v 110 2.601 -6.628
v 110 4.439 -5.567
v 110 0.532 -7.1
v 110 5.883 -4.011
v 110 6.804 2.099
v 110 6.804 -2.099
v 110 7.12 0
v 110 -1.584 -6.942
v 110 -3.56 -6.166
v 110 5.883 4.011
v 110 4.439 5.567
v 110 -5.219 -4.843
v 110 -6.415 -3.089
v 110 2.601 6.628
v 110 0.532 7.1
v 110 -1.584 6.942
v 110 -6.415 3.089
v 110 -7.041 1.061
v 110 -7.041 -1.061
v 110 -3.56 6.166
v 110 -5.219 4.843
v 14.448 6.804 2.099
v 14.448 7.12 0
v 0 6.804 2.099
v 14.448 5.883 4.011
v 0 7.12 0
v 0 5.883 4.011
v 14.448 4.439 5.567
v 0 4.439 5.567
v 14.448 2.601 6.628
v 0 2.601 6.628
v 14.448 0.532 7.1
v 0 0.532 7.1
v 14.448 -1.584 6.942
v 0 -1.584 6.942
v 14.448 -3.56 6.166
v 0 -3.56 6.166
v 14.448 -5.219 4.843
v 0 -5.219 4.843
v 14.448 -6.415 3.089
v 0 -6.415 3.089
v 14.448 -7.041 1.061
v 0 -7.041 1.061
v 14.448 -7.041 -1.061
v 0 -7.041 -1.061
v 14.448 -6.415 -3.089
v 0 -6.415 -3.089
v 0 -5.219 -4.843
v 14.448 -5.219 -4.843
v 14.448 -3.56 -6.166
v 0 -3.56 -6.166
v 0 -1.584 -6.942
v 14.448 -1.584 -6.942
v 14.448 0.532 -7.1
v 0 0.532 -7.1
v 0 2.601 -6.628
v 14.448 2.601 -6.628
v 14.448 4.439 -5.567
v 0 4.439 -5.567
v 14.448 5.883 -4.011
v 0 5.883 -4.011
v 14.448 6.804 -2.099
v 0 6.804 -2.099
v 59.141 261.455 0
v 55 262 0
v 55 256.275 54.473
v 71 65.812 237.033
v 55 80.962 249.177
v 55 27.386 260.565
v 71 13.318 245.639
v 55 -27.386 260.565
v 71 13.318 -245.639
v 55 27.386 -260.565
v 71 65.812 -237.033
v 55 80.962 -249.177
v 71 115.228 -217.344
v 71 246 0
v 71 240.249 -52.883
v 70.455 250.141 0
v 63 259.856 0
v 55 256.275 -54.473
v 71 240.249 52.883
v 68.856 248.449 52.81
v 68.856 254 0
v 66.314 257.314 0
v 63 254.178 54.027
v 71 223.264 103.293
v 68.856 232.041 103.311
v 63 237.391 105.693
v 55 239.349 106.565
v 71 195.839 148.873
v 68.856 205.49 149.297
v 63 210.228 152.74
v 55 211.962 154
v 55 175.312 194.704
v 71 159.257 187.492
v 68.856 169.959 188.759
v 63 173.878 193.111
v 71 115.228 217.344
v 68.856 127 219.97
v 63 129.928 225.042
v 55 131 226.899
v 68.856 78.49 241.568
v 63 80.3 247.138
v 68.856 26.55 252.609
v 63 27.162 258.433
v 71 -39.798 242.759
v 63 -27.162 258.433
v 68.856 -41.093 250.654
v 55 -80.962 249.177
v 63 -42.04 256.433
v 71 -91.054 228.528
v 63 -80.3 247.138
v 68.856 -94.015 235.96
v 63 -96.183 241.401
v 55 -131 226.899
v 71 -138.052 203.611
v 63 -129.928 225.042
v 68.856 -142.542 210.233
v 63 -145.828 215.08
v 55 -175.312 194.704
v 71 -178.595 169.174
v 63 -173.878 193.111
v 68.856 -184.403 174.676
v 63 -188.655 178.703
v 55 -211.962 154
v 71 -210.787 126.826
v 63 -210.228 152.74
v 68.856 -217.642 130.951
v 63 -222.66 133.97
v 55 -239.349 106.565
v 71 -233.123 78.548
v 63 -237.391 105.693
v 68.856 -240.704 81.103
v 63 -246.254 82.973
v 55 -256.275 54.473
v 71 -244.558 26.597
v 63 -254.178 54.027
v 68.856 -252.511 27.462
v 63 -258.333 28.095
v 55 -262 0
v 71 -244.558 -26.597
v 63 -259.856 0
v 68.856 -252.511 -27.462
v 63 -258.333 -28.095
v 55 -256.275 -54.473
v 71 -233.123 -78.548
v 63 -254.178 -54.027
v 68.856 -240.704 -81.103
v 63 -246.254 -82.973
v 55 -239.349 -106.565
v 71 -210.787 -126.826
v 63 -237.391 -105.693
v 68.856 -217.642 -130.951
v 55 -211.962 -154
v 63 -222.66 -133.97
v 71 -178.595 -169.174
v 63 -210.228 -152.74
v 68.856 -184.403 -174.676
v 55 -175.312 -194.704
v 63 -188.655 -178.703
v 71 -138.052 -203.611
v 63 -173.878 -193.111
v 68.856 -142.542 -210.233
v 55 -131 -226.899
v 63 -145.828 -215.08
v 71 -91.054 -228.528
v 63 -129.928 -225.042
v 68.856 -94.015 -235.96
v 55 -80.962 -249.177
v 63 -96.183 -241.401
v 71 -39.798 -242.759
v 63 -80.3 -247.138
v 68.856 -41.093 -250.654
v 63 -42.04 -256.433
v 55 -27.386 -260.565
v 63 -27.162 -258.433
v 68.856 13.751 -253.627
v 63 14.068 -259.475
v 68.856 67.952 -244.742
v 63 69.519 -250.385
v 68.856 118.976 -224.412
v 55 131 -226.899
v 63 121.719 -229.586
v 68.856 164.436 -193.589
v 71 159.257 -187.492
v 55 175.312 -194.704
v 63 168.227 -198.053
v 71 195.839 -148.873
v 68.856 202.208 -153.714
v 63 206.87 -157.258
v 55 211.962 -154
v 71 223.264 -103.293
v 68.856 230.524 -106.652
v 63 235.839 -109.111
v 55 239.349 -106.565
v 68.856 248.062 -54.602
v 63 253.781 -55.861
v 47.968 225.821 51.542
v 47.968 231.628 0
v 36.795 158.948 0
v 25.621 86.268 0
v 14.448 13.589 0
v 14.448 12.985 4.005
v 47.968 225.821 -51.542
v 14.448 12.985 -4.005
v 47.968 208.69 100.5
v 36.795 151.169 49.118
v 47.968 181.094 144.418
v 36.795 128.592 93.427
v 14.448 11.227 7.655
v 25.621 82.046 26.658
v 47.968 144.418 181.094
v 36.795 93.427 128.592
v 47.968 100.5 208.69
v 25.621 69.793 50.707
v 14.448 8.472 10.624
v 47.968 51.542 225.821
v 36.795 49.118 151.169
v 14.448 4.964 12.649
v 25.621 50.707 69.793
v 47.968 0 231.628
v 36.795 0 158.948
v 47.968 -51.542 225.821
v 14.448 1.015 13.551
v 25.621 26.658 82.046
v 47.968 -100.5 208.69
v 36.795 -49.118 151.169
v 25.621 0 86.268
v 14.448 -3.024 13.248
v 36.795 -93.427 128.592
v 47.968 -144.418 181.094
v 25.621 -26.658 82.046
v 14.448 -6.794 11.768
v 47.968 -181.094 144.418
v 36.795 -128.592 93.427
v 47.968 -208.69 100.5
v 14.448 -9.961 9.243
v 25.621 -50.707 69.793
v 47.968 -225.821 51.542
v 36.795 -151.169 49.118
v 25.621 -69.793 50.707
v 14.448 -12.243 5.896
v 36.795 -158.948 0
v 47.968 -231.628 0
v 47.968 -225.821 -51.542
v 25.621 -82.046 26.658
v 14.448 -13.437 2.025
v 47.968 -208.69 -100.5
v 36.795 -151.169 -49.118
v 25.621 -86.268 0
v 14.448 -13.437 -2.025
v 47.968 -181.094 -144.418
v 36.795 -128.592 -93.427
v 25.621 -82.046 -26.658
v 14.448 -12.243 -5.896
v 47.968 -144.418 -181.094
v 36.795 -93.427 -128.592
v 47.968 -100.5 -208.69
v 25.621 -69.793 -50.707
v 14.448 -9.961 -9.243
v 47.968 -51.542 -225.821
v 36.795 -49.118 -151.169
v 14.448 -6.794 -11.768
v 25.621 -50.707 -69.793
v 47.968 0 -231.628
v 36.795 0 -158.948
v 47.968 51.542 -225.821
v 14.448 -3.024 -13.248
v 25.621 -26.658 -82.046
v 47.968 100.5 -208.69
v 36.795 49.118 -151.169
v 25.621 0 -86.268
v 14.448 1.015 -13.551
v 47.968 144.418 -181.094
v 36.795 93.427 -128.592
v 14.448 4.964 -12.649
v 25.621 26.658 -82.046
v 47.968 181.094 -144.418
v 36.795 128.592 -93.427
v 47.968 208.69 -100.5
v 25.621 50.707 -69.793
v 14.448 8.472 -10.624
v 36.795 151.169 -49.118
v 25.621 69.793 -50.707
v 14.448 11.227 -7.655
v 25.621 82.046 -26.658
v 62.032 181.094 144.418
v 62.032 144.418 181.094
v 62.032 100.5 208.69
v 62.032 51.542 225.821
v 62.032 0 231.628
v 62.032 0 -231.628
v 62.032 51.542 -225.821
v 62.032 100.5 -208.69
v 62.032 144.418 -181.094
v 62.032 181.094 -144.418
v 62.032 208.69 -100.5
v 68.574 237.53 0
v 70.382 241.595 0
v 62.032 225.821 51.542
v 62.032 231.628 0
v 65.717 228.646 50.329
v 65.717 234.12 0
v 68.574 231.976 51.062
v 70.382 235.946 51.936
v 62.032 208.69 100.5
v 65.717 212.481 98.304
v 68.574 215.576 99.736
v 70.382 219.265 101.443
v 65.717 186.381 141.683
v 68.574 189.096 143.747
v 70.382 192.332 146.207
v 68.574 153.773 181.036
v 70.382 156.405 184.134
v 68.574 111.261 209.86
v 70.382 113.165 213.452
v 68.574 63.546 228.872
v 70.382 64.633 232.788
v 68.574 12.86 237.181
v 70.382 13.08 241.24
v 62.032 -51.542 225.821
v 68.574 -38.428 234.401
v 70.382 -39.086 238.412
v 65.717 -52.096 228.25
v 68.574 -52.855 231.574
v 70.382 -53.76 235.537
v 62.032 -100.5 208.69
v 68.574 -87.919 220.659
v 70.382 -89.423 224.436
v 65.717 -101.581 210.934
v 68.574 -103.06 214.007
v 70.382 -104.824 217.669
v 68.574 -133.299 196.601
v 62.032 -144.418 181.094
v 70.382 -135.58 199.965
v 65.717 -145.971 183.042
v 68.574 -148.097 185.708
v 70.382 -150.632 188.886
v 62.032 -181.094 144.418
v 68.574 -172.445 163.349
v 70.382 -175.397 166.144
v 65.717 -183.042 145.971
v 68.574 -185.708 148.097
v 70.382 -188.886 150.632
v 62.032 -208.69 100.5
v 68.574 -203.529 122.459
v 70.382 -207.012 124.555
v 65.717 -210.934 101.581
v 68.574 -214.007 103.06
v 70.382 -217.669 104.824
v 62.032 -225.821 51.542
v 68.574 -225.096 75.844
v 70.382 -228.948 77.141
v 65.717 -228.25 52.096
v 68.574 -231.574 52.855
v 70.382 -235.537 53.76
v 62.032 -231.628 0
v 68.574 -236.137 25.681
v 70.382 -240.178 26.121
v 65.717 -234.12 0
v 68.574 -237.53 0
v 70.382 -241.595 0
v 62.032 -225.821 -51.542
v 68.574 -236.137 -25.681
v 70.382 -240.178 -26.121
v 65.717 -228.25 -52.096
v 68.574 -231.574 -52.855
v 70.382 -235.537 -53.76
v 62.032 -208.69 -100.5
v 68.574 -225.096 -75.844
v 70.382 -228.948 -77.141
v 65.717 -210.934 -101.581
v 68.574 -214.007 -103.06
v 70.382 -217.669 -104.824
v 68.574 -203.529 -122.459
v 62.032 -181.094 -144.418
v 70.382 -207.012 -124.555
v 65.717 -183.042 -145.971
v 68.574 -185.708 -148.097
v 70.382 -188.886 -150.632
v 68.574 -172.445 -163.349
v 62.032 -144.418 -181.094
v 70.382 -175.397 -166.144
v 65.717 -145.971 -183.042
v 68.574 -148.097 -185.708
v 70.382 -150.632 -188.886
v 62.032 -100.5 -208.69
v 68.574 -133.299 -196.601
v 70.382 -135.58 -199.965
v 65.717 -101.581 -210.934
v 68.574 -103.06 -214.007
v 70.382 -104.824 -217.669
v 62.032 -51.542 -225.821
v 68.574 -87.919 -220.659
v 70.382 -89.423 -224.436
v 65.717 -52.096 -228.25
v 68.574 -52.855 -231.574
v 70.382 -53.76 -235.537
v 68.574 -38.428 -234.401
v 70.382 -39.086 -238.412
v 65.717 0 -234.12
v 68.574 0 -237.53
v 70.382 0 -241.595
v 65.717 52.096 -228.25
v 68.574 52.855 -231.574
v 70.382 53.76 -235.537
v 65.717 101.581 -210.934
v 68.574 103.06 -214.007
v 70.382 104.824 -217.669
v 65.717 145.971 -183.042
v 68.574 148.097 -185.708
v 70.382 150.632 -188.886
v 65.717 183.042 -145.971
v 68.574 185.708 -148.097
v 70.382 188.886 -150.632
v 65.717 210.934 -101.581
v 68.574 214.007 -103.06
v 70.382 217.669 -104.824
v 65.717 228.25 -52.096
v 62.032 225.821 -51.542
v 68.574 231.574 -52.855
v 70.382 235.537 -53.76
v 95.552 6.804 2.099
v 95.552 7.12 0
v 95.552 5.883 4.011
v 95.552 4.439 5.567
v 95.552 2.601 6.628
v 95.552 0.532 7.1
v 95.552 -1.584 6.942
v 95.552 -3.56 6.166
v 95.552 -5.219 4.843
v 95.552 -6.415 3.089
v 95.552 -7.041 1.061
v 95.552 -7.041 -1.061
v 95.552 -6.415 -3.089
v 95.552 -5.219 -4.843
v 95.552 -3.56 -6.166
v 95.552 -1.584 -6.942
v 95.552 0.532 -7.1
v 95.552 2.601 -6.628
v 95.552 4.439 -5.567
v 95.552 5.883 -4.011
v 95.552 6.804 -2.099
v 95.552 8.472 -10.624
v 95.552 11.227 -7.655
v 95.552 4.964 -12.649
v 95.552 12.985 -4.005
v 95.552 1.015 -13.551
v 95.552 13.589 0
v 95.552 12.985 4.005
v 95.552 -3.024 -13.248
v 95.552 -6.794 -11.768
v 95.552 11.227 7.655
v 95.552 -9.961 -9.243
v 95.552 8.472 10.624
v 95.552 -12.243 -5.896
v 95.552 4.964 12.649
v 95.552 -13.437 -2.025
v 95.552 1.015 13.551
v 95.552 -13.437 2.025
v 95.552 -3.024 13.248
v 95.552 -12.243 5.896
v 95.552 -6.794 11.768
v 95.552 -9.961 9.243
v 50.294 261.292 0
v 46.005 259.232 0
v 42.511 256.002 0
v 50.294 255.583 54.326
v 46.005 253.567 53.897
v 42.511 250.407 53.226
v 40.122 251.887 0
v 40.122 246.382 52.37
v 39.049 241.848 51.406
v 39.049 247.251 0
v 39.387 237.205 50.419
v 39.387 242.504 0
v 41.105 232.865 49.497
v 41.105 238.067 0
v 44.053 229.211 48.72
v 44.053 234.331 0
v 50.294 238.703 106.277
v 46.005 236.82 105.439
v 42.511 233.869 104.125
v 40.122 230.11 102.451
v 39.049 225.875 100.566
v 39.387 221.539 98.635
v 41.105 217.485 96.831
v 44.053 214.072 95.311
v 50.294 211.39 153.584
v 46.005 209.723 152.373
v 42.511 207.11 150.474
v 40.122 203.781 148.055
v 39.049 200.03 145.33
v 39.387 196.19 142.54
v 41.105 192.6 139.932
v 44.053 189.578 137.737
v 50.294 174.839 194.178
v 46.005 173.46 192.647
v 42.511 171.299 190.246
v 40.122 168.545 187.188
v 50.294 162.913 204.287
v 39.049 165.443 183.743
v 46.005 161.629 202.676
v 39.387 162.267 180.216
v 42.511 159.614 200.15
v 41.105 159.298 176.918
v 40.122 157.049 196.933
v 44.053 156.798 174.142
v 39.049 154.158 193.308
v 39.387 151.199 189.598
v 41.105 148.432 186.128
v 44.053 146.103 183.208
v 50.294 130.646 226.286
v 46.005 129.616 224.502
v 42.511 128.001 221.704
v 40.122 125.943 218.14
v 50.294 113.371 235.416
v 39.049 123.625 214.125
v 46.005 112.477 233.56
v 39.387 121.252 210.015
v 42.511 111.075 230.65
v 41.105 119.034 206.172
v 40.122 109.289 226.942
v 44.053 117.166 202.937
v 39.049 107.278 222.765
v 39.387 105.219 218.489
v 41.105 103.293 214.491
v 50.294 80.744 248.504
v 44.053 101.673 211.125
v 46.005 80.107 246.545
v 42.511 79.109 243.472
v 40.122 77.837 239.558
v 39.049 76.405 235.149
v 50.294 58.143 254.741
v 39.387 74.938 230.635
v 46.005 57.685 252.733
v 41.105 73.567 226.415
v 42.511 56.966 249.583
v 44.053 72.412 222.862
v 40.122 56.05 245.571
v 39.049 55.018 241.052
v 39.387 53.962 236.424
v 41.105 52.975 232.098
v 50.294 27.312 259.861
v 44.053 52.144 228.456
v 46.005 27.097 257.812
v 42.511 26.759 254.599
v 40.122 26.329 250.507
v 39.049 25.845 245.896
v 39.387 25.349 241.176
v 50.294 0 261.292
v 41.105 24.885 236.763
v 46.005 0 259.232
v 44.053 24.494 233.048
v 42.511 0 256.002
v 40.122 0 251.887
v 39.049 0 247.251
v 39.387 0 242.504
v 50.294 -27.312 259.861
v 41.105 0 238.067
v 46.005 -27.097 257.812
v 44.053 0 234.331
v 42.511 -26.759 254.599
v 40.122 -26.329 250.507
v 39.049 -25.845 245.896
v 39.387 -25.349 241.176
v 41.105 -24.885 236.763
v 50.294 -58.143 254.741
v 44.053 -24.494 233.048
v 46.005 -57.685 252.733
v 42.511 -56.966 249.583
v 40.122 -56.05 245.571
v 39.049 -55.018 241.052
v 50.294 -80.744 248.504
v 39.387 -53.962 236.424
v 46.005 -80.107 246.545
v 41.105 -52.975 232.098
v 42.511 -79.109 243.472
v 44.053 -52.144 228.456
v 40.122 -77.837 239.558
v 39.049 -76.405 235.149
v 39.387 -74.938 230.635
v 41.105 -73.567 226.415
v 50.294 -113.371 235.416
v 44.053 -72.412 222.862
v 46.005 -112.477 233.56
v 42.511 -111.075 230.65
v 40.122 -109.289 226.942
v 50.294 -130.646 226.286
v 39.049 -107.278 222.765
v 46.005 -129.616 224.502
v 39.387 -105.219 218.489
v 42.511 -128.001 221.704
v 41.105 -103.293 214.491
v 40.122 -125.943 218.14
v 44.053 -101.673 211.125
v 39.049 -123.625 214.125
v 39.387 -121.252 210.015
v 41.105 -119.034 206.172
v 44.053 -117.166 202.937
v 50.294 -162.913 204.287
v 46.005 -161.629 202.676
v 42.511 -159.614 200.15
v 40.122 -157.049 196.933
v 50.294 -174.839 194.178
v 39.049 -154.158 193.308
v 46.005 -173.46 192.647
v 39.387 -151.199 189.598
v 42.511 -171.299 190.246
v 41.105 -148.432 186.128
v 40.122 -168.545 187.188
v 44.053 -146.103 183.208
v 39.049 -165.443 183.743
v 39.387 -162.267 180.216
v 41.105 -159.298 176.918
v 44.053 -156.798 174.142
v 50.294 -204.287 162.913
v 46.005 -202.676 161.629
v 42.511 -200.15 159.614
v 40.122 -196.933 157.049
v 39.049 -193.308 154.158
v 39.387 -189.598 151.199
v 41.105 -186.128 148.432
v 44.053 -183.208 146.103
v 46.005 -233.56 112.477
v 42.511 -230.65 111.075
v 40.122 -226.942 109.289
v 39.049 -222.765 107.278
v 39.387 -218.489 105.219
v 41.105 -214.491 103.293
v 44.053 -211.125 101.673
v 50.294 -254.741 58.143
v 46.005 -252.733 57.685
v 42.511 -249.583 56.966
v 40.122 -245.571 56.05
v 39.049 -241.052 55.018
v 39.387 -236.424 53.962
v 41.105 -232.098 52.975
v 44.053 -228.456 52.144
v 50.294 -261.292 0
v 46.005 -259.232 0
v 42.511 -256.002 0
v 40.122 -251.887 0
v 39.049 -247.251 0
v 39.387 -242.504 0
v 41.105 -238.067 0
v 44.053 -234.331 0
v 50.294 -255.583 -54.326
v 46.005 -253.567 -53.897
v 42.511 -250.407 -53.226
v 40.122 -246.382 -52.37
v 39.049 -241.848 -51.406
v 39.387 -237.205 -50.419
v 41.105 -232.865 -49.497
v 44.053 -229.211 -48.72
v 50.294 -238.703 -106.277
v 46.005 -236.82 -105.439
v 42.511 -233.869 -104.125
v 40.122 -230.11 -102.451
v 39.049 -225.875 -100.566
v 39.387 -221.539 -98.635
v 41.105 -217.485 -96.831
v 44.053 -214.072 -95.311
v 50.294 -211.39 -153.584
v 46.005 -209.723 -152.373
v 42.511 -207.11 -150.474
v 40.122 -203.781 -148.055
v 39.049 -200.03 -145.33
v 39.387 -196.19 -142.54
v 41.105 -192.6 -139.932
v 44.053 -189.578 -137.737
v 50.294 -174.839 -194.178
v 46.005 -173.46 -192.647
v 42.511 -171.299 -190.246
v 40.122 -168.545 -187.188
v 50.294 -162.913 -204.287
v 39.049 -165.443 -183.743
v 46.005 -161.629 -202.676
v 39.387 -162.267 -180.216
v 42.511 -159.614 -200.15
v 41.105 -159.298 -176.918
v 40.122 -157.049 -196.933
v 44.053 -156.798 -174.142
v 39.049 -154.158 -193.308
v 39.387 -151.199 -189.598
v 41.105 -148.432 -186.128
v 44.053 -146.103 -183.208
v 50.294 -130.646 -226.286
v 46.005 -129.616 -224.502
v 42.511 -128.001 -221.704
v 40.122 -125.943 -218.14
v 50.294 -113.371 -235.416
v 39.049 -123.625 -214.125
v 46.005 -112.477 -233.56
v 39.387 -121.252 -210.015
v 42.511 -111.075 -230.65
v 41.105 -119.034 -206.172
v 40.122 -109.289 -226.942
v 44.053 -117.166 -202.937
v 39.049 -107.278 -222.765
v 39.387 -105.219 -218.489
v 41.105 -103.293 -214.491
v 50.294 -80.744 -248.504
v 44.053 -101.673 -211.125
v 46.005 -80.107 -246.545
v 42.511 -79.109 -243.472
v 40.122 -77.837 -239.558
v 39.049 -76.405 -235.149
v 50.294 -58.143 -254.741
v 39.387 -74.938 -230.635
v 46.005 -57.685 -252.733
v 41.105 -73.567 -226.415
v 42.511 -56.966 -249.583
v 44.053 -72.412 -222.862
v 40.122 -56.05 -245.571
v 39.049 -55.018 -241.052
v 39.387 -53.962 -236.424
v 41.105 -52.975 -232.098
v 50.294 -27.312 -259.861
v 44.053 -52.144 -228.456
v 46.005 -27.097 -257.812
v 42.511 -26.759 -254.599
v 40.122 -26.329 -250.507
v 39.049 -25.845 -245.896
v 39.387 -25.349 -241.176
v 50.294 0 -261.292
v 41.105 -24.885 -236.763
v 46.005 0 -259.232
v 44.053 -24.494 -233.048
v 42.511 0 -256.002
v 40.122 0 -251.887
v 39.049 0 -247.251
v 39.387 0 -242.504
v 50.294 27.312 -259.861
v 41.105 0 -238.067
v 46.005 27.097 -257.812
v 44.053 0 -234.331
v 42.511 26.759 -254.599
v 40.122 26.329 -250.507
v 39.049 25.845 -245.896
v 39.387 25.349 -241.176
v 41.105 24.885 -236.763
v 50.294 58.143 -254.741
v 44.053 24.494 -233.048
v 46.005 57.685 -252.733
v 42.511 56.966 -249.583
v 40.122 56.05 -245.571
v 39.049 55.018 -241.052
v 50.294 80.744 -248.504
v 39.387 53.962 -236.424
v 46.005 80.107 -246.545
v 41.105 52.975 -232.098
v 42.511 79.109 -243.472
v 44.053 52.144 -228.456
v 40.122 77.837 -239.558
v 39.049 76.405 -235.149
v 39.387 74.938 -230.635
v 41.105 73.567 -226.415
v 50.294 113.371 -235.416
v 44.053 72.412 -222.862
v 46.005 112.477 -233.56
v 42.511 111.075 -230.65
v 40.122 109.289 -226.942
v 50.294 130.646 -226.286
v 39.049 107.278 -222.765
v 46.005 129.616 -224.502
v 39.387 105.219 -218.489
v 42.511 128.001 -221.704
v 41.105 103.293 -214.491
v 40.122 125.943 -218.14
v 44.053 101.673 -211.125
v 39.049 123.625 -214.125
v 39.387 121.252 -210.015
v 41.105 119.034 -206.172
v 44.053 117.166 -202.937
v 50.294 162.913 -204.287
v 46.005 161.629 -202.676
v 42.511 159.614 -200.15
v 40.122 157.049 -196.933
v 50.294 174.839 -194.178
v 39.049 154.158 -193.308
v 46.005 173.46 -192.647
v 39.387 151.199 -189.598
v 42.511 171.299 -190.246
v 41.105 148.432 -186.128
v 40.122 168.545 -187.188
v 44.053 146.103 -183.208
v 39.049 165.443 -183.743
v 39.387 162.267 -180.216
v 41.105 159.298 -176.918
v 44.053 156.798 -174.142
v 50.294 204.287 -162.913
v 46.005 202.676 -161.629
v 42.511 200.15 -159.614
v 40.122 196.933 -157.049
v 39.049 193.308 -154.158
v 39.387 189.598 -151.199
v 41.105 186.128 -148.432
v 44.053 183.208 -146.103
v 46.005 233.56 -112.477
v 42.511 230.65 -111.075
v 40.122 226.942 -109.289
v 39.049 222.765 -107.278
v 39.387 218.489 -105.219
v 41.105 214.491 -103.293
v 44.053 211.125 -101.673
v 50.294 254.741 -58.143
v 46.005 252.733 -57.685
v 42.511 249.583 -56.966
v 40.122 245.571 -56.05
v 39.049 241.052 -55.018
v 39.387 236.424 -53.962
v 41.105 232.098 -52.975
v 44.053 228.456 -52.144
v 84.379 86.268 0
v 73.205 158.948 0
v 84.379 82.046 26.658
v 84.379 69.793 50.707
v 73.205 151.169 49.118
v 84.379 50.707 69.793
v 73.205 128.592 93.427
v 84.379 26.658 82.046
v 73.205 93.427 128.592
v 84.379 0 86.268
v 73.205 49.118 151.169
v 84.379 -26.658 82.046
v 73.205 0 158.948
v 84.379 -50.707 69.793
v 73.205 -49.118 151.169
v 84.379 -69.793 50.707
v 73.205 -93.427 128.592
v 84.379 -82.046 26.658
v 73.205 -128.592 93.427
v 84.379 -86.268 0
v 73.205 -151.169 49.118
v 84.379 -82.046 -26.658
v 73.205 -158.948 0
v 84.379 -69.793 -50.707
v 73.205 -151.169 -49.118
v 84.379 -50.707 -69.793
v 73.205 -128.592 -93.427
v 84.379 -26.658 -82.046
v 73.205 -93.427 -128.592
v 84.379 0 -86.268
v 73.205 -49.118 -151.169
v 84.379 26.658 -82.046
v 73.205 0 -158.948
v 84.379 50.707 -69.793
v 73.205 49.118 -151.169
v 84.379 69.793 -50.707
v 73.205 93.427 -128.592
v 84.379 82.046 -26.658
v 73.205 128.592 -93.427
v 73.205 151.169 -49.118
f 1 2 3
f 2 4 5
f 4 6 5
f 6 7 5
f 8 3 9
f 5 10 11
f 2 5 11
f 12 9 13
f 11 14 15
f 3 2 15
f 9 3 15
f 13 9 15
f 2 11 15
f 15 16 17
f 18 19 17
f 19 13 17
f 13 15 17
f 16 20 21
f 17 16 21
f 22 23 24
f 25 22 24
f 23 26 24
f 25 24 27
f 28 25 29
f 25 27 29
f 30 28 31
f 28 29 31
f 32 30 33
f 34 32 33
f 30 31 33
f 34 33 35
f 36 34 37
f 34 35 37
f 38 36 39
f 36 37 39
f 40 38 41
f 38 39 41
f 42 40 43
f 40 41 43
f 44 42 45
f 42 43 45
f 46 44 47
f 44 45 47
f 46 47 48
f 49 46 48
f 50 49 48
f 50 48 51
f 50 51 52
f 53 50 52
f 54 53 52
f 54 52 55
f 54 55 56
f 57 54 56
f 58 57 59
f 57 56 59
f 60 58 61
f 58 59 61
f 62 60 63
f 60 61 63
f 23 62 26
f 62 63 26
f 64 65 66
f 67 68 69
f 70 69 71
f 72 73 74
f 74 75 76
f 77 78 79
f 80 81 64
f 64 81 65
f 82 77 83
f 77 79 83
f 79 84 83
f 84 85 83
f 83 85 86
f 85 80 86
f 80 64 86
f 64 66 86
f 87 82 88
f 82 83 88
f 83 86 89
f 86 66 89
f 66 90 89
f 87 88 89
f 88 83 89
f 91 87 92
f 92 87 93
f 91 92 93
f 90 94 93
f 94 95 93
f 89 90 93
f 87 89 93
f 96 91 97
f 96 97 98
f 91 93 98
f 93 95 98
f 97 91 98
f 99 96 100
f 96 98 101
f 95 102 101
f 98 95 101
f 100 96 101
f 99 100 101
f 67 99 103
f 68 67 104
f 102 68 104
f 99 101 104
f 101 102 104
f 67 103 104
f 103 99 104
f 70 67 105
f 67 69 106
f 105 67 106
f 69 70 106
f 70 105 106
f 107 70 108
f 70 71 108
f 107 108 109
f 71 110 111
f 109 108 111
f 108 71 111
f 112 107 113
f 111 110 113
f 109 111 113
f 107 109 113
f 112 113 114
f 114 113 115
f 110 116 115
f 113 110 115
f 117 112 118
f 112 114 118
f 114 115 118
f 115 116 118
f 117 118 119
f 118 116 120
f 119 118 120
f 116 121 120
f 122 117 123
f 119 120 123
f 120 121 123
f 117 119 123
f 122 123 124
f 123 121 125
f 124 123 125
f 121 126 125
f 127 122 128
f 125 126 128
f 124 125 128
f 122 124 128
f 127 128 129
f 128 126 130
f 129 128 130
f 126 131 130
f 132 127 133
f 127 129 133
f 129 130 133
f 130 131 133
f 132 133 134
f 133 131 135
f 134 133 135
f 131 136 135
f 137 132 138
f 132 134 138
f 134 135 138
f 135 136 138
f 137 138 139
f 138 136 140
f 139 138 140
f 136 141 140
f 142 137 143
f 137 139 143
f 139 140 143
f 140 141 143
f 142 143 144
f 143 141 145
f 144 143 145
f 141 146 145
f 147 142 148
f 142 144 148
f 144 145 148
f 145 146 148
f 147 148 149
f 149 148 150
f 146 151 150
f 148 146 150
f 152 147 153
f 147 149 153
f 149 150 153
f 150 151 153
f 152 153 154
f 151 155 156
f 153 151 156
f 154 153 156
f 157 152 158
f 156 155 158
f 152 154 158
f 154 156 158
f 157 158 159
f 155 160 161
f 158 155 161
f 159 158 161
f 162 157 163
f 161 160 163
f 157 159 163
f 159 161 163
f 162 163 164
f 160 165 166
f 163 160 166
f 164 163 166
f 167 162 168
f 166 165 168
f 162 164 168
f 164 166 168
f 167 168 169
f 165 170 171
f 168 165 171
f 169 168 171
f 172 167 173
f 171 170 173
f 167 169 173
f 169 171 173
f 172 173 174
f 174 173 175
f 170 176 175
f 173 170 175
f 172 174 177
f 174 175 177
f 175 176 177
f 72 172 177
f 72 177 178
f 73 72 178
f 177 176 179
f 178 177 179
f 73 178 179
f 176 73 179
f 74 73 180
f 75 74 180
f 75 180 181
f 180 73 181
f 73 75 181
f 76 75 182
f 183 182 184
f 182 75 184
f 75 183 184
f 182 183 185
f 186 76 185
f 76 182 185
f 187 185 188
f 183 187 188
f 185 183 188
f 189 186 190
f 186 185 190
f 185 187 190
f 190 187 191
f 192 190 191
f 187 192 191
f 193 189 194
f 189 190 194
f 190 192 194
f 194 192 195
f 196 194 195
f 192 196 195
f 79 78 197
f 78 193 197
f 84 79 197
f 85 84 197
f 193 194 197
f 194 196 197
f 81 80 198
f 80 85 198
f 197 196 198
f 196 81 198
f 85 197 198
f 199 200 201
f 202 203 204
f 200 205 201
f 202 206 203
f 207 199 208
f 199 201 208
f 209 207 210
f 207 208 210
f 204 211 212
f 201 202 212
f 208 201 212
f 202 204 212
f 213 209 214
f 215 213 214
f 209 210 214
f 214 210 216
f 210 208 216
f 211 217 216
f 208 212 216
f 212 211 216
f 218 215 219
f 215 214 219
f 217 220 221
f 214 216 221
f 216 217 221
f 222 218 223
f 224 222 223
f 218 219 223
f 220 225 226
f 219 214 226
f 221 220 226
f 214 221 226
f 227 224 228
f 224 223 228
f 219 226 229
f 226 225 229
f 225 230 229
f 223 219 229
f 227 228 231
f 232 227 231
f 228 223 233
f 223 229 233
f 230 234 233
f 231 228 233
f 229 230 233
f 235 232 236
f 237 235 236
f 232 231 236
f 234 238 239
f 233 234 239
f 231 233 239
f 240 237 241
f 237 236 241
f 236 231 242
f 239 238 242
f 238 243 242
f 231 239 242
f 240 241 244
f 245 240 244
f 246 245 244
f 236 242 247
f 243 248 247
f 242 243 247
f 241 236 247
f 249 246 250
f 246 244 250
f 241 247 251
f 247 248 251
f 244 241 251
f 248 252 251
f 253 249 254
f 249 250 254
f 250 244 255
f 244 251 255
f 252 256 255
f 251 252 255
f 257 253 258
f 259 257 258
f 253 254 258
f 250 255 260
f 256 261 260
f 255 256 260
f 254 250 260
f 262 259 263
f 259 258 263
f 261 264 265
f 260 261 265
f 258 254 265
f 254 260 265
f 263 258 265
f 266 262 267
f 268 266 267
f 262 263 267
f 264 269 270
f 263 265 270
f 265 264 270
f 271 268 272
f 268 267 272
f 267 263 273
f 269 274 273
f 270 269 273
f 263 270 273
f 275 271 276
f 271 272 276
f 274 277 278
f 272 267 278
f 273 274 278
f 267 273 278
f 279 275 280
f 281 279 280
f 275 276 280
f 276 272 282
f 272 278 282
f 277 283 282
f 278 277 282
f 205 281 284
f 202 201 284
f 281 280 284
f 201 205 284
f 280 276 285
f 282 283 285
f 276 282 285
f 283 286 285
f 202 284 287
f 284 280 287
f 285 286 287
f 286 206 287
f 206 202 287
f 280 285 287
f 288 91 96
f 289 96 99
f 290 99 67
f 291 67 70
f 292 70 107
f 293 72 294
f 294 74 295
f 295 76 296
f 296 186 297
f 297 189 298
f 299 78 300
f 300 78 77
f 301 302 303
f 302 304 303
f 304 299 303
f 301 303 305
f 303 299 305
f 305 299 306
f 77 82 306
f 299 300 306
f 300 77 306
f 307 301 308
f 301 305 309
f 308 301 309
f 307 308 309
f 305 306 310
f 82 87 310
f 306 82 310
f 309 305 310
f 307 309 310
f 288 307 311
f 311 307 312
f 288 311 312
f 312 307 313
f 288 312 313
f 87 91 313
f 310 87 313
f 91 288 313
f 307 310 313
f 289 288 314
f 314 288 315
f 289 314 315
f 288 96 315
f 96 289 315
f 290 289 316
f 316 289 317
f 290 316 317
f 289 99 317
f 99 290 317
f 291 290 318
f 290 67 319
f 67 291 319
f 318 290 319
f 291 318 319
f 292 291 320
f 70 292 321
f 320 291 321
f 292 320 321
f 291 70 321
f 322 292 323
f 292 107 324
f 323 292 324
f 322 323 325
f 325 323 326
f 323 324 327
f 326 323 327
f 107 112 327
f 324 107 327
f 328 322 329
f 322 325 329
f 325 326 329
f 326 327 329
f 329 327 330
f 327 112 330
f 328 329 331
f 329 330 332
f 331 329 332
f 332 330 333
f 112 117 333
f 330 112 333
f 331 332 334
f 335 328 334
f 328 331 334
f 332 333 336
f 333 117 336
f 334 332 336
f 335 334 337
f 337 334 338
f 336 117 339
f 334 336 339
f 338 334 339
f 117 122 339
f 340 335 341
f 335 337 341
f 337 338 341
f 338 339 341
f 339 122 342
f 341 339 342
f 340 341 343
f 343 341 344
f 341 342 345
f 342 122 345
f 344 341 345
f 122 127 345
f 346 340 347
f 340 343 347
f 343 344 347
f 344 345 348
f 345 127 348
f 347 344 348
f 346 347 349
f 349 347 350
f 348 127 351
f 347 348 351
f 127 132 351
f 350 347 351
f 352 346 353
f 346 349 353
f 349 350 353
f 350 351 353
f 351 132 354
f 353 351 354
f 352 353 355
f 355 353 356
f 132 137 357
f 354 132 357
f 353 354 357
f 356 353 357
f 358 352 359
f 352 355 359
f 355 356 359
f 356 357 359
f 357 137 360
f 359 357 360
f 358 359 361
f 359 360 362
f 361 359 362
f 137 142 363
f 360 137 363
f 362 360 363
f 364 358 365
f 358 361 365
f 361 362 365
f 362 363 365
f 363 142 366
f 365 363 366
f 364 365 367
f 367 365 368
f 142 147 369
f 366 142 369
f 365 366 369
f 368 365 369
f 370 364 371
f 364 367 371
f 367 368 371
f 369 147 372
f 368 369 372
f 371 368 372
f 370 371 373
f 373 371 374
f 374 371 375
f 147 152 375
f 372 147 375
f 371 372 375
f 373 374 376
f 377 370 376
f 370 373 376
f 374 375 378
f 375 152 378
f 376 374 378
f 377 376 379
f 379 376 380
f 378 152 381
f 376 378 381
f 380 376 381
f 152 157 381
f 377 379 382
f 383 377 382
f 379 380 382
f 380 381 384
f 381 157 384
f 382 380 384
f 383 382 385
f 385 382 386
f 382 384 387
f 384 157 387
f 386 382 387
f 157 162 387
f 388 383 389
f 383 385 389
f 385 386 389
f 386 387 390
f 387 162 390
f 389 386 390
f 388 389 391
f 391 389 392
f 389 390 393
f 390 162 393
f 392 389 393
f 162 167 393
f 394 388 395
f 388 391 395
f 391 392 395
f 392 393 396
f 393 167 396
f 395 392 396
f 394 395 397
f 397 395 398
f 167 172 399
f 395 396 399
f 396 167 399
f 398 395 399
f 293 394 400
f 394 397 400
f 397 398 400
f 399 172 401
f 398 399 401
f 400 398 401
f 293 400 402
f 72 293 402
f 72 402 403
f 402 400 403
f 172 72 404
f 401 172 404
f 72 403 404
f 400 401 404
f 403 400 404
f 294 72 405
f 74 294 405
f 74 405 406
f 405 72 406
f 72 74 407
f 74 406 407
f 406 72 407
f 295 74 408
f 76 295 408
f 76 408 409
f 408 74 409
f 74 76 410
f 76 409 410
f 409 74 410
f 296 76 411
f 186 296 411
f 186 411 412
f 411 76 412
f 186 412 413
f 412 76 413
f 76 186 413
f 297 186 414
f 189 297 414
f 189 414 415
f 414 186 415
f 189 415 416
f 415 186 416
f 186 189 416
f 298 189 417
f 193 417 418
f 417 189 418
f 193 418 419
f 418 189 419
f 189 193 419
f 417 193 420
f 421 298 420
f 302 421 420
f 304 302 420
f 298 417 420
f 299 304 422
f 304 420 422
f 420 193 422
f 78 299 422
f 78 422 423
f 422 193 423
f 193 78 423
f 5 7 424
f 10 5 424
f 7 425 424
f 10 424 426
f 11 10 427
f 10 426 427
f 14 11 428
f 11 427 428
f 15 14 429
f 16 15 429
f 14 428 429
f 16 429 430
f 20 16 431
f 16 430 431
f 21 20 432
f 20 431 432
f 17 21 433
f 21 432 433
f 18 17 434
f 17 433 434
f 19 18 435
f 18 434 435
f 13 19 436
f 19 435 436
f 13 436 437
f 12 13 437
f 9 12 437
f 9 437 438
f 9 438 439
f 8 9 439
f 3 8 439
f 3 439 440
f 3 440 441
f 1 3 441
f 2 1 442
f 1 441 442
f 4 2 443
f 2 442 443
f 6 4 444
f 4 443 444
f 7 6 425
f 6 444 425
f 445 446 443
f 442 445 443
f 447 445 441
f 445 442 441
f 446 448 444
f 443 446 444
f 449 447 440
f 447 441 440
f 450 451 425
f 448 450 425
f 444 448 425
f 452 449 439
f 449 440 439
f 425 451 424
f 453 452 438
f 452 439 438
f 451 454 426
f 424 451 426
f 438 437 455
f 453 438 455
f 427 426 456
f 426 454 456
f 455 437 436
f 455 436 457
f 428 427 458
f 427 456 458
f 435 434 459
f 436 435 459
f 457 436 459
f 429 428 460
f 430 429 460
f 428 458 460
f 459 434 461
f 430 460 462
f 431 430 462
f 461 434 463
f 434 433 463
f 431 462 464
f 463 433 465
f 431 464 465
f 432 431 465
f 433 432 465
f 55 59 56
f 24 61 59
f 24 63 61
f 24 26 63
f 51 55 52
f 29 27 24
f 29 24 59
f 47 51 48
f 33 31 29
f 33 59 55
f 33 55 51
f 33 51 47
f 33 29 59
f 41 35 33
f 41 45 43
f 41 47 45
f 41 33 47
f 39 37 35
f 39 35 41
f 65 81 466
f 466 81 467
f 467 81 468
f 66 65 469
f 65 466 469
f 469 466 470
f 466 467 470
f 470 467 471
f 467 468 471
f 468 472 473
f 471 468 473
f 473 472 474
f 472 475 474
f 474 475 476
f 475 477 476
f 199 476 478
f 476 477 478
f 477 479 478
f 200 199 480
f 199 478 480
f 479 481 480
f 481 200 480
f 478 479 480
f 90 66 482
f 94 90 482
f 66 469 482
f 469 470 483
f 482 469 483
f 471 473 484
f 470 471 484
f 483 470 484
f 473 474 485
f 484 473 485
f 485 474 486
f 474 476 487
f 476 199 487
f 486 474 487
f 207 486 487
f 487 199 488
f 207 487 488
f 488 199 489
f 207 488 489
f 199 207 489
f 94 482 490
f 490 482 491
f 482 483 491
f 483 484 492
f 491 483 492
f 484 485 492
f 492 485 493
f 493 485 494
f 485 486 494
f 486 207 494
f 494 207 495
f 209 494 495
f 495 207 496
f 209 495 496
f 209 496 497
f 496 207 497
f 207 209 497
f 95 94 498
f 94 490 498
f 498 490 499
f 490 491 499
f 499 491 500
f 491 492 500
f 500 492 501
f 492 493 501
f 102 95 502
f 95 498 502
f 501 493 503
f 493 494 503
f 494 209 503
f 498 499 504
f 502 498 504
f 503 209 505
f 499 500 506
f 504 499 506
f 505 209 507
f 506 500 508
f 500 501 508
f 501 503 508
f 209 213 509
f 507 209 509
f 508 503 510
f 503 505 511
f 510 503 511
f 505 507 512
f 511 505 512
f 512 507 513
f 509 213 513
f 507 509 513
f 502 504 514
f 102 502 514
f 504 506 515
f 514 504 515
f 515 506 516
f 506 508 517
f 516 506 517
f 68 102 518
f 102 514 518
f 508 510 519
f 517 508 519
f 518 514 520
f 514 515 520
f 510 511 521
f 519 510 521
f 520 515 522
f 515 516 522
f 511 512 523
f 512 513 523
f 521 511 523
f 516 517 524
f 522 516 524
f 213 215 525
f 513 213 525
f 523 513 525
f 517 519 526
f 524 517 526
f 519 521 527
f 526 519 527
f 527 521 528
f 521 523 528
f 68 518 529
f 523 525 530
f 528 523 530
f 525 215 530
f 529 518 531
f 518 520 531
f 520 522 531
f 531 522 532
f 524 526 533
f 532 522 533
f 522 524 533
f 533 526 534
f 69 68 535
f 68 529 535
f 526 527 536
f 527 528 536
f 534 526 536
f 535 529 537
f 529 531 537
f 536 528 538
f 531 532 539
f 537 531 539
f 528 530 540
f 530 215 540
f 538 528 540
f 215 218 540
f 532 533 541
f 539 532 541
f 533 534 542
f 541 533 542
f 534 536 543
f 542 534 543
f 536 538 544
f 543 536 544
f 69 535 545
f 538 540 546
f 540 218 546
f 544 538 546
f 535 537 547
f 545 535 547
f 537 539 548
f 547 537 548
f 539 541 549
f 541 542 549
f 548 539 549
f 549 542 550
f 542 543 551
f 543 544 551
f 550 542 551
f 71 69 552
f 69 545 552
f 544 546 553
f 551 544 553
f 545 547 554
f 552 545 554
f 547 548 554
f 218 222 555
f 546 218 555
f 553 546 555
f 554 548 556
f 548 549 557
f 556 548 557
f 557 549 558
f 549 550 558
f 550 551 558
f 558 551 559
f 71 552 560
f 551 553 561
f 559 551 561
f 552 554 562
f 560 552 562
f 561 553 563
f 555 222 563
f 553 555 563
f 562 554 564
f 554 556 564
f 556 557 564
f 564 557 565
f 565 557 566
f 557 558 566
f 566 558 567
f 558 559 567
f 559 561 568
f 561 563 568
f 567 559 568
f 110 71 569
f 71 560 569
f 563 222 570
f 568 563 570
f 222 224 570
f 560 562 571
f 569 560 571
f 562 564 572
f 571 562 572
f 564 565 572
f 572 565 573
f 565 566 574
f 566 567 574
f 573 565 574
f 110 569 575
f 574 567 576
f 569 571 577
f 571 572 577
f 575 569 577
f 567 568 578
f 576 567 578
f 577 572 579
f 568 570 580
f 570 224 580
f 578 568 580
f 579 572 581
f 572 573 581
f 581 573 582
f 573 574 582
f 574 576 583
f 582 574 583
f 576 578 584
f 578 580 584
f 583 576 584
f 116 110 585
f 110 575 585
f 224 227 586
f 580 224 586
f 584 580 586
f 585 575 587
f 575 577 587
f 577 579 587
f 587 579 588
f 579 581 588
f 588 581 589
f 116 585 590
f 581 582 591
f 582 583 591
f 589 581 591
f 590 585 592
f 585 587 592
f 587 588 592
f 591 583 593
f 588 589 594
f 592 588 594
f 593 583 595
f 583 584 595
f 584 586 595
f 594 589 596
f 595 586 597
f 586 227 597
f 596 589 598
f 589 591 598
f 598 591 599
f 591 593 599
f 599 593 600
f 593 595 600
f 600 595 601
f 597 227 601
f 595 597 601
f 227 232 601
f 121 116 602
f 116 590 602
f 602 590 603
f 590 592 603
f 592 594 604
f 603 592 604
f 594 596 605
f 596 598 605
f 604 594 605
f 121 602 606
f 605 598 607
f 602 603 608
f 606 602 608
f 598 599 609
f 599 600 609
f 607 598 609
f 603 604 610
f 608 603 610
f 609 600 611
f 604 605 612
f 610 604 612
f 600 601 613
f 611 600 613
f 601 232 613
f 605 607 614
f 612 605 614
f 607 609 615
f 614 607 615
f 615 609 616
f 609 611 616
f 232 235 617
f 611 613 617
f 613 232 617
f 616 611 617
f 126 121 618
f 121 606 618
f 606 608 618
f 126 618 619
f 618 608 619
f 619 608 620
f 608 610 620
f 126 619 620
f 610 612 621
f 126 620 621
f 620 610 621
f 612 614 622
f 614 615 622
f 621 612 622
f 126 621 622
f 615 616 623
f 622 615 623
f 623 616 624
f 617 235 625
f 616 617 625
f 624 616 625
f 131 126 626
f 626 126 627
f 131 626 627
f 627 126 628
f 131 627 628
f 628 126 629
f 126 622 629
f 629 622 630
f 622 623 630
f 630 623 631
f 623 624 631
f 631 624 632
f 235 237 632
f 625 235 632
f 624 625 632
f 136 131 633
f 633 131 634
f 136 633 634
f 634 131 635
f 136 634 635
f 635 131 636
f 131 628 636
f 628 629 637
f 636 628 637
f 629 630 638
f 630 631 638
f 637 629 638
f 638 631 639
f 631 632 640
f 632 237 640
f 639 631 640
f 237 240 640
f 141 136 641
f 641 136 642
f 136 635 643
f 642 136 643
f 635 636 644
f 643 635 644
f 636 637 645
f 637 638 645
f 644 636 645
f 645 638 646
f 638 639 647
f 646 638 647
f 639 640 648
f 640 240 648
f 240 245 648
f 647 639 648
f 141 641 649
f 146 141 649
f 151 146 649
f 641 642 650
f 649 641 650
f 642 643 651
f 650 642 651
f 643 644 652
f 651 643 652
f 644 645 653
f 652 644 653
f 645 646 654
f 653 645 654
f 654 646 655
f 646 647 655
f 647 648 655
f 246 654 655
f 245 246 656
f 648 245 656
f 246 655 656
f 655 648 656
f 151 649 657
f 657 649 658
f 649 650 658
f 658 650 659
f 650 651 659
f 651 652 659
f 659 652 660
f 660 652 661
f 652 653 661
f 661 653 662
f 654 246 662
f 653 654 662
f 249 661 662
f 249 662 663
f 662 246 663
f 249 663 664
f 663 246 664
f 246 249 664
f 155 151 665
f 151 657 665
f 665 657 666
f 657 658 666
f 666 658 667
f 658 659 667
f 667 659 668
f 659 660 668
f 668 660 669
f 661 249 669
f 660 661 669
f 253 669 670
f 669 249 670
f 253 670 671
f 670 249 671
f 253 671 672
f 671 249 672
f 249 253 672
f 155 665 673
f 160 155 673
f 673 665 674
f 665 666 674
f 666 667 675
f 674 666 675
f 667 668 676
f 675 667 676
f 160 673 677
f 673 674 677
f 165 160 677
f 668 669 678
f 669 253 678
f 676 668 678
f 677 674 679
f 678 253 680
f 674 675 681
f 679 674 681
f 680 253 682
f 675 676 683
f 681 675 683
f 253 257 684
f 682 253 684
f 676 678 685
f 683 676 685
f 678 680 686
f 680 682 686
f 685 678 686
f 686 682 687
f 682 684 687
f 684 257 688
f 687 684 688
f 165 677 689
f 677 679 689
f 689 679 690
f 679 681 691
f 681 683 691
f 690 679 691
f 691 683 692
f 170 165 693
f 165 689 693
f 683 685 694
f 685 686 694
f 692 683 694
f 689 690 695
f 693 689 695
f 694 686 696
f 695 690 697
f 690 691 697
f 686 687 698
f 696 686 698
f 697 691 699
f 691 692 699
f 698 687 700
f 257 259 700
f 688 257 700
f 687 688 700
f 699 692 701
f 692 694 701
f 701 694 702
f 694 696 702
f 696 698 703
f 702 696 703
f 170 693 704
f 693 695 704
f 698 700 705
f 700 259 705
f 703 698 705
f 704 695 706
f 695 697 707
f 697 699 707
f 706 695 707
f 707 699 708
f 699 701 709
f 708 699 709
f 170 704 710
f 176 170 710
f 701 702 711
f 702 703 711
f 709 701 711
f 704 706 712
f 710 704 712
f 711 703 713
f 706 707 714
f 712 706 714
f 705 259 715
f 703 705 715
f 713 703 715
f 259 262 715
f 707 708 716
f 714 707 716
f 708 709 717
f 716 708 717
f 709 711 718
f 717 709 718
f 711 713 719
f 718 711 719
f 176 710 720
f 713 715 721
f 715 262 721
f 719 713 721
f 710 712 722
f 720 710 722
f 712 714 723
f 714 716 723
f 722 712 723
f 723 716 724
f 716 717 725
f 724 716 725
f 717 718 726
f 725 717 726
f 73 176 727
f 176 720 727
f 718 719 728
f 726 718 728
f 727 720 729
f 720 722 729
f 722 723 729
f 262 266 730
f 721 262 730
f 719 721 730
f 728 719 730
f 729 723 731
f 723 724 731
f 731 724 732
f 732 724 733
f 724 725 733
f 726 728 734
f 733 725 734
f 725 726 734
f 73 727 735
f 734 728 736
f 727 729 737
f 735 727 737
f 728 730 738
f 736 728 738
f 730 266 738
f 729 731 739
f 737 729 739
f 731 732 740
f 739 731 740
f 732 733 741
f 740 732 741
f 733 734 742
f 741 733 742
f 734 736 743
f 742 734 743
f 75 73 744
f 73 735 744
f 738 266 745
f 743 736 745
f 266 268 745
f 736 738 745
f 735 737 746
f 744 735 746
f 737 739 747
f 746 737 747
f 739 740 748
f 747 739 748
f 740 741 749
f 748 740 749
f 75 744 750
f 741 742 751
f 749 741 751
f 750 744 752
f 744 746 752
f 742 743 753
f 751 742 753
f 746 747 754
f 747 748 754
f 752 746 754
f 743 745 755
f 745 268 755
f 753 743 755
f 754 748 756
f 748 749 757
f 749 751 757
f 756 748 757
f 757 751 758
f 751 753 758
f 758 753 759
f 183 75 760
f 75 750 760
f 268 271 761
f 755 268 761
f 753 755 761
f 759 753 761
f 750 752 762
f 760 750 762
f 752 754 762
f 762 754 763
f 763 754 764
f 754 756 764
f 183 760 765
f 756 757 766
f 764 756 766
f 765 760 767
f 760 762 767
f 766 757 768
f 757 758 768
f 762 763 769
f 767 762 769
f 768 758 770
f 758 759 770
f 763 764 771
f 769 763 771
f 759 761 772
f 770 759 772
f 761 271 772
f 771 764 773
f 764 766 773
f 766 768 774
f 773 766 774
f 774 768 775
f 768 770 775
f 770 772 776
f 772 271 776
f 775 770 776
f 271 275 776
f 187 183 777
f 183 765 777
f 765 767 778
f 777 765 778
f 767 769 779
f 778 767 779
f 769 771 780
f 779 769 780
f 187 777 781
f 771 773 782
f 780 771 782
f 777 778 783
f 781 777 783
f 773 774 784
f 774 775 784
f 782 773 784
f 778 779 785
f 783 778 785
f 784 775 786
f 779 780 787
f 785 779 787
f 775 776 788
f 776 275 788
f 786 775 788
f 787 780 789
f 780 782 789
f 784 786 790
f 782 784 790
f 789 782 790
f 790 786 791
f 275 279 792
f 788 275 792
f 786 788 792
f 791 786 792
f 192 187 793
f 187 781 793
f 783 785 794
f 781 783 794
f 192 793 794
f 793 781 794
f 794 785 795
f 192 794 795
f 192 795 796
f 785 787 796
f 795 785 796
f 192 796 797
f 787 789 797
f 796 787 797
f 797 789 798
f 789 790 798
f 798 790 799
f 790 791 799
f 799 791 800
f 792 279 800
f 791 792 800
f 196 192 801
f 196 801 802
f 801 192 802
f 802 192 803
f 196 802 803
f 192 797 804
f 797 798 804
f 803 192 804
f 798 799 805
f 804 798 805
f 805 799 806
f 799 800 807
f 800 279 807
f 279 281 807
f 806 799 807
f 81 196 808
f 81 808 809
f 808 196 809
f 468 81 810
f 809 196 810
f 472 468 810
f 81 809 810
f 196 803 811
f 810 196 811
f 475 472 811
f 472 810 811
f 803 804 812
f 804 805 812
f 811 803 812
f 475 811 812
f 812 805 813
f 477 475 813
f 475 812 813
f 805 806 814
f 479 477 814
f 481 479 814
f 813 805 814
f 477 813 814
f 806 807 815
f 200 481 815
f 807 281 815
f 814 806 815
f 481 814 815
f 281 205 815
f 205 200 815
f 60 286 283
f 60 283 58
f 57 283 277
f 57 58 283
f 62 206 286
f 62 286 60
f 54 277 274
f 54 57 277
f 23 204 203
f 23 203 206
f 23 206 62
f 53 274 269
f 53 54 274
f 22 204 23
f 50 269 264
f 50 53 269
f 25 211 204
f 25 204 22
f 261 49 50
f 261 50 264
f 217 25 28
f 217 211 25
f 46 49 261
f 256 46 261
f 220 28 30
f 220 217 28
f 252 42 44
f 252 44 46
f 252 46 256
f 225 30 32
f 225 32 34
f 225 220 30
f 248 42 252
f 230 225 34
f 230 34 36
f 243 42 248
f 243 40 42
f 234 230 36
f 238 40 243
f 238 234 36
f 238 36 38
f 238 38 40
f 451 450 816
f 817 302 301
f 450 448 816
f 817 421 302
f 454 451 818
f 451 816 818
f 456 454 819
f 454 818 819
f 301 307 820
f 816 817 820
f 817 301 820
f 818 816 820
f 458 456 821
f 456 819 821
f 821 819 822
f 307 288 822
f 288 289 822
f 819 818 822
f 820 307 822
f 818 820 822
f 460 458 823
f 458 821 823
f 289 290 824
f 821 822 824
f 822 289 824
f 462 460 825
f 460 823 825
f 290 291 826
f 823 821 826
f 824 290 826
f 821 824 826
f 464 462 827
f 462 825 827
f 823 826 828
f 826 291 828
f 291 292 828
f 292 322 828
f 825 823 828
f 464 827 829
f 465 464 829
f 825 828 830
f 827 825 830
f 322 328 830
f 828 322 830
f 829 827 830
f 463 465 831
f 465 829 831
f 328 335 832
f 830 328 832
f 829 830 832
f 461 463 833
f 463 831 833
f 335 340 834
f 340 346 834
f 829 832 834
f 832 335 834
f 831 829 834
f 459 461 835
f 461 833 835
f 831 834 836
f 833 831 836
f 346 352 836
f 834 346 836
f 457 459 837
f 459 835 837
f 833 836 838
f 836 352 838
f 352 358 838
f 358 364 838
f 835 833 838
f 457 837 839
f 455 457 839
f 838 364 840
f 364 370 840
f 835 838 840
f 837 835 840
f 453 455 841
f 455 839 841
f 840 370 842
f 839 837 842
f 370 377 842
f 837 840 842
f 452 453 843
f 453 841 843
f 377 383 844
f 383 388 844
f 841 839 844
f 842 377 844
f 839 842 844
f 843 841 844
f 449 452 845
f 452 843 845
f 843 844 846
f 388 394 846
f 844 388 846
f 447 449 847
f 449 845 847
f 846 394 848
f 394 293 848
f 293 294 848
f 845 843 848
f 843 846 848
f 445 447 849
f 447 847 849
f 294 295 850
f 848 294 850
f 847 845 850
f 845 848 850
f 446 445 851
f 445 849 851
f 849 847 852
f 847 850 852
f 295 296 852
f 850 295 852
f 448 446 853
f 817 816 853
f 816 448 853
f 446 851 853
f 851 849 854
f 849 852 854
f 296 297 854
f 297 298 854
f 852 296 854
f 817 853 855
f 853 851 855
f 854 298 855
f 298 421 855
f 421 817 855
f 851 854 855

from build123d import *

# Parameters (mm, degrees)
F0_W   = 14.447578
F0_H   = 7.120048
F0_W_2 = 40.552422
F0_H_2 = 6.468568


with BuildPart() as f1:
    # F0 (on Top) → F1 (revolve)
    with BuildSketch(Plane.XY):
        with Locations((7.223789, 3.560024)):
            Rectangle(F0_W, F0_H)
        with Locations((34.723789, 3.560024)):
            Rectangle(F0_W_2, F0_H)
        with Locations((75.276211, 3.560024)):
            Rectangle(F0_W_2, F0_H)
        with Locations((34.723789, 10.354332)):
            Rectangle(F0_W_2, F0_H_2)
        with Locations((102.776211, 3.560024)):
            Rectangle(F0_W, F0_H)
        with Locations((75.276211, 10.354332)):
            Rectangle(F0_W_2, F0_H_2)
        with BuildLine():
            Line((47.968432, 231.627907), (14.447578, 13.588616))
            Line((14.447578, 13.588616), (55, 13.588616))
            Line((55, 13.588616), (55, 230))
            ThreePointArc((55, 230), (51.391225, 230.412289), (47.968432, 231.627907))
        make_face()
        with BuildLine():
            Line((55, 230), (55, 13.588616))
            Line((55, 13.588616), (95.552422, 13.588616))
            Line((95.552422, 13.588616), (62.031568, 231.627907))
            ThreePointArc((62.031568, 231.627907), (58.608775, 230.412289), (55, 230))
        make_face()
        with BuildLine():
            ThreePointArc((55, 262), (39.412289, 249.608775), (47.968432, 231.627907))
            ThreePointArc((47.968432, 231.627907), (51.391225, 230.412289), (55, 230))
            Line((55, 230), (55, 262))
        make_face()
        with BuildLine():
            Line((55, 262), (55, 230))
            ThreePointArc((55, 230), (58.608775, 230.412289), (62.031568, 231.627907))
            ThreePointArc((62.031568, 231.627907), (68.573966, 237.529613), (71, 246))
            ThreePointArc((71, 246), (66.313708, 257.313708), (55, 262))
        make_face()
    revolve(axis=Axis((55, 0, 0), (1, 0, 0)))


solid = f1.part
